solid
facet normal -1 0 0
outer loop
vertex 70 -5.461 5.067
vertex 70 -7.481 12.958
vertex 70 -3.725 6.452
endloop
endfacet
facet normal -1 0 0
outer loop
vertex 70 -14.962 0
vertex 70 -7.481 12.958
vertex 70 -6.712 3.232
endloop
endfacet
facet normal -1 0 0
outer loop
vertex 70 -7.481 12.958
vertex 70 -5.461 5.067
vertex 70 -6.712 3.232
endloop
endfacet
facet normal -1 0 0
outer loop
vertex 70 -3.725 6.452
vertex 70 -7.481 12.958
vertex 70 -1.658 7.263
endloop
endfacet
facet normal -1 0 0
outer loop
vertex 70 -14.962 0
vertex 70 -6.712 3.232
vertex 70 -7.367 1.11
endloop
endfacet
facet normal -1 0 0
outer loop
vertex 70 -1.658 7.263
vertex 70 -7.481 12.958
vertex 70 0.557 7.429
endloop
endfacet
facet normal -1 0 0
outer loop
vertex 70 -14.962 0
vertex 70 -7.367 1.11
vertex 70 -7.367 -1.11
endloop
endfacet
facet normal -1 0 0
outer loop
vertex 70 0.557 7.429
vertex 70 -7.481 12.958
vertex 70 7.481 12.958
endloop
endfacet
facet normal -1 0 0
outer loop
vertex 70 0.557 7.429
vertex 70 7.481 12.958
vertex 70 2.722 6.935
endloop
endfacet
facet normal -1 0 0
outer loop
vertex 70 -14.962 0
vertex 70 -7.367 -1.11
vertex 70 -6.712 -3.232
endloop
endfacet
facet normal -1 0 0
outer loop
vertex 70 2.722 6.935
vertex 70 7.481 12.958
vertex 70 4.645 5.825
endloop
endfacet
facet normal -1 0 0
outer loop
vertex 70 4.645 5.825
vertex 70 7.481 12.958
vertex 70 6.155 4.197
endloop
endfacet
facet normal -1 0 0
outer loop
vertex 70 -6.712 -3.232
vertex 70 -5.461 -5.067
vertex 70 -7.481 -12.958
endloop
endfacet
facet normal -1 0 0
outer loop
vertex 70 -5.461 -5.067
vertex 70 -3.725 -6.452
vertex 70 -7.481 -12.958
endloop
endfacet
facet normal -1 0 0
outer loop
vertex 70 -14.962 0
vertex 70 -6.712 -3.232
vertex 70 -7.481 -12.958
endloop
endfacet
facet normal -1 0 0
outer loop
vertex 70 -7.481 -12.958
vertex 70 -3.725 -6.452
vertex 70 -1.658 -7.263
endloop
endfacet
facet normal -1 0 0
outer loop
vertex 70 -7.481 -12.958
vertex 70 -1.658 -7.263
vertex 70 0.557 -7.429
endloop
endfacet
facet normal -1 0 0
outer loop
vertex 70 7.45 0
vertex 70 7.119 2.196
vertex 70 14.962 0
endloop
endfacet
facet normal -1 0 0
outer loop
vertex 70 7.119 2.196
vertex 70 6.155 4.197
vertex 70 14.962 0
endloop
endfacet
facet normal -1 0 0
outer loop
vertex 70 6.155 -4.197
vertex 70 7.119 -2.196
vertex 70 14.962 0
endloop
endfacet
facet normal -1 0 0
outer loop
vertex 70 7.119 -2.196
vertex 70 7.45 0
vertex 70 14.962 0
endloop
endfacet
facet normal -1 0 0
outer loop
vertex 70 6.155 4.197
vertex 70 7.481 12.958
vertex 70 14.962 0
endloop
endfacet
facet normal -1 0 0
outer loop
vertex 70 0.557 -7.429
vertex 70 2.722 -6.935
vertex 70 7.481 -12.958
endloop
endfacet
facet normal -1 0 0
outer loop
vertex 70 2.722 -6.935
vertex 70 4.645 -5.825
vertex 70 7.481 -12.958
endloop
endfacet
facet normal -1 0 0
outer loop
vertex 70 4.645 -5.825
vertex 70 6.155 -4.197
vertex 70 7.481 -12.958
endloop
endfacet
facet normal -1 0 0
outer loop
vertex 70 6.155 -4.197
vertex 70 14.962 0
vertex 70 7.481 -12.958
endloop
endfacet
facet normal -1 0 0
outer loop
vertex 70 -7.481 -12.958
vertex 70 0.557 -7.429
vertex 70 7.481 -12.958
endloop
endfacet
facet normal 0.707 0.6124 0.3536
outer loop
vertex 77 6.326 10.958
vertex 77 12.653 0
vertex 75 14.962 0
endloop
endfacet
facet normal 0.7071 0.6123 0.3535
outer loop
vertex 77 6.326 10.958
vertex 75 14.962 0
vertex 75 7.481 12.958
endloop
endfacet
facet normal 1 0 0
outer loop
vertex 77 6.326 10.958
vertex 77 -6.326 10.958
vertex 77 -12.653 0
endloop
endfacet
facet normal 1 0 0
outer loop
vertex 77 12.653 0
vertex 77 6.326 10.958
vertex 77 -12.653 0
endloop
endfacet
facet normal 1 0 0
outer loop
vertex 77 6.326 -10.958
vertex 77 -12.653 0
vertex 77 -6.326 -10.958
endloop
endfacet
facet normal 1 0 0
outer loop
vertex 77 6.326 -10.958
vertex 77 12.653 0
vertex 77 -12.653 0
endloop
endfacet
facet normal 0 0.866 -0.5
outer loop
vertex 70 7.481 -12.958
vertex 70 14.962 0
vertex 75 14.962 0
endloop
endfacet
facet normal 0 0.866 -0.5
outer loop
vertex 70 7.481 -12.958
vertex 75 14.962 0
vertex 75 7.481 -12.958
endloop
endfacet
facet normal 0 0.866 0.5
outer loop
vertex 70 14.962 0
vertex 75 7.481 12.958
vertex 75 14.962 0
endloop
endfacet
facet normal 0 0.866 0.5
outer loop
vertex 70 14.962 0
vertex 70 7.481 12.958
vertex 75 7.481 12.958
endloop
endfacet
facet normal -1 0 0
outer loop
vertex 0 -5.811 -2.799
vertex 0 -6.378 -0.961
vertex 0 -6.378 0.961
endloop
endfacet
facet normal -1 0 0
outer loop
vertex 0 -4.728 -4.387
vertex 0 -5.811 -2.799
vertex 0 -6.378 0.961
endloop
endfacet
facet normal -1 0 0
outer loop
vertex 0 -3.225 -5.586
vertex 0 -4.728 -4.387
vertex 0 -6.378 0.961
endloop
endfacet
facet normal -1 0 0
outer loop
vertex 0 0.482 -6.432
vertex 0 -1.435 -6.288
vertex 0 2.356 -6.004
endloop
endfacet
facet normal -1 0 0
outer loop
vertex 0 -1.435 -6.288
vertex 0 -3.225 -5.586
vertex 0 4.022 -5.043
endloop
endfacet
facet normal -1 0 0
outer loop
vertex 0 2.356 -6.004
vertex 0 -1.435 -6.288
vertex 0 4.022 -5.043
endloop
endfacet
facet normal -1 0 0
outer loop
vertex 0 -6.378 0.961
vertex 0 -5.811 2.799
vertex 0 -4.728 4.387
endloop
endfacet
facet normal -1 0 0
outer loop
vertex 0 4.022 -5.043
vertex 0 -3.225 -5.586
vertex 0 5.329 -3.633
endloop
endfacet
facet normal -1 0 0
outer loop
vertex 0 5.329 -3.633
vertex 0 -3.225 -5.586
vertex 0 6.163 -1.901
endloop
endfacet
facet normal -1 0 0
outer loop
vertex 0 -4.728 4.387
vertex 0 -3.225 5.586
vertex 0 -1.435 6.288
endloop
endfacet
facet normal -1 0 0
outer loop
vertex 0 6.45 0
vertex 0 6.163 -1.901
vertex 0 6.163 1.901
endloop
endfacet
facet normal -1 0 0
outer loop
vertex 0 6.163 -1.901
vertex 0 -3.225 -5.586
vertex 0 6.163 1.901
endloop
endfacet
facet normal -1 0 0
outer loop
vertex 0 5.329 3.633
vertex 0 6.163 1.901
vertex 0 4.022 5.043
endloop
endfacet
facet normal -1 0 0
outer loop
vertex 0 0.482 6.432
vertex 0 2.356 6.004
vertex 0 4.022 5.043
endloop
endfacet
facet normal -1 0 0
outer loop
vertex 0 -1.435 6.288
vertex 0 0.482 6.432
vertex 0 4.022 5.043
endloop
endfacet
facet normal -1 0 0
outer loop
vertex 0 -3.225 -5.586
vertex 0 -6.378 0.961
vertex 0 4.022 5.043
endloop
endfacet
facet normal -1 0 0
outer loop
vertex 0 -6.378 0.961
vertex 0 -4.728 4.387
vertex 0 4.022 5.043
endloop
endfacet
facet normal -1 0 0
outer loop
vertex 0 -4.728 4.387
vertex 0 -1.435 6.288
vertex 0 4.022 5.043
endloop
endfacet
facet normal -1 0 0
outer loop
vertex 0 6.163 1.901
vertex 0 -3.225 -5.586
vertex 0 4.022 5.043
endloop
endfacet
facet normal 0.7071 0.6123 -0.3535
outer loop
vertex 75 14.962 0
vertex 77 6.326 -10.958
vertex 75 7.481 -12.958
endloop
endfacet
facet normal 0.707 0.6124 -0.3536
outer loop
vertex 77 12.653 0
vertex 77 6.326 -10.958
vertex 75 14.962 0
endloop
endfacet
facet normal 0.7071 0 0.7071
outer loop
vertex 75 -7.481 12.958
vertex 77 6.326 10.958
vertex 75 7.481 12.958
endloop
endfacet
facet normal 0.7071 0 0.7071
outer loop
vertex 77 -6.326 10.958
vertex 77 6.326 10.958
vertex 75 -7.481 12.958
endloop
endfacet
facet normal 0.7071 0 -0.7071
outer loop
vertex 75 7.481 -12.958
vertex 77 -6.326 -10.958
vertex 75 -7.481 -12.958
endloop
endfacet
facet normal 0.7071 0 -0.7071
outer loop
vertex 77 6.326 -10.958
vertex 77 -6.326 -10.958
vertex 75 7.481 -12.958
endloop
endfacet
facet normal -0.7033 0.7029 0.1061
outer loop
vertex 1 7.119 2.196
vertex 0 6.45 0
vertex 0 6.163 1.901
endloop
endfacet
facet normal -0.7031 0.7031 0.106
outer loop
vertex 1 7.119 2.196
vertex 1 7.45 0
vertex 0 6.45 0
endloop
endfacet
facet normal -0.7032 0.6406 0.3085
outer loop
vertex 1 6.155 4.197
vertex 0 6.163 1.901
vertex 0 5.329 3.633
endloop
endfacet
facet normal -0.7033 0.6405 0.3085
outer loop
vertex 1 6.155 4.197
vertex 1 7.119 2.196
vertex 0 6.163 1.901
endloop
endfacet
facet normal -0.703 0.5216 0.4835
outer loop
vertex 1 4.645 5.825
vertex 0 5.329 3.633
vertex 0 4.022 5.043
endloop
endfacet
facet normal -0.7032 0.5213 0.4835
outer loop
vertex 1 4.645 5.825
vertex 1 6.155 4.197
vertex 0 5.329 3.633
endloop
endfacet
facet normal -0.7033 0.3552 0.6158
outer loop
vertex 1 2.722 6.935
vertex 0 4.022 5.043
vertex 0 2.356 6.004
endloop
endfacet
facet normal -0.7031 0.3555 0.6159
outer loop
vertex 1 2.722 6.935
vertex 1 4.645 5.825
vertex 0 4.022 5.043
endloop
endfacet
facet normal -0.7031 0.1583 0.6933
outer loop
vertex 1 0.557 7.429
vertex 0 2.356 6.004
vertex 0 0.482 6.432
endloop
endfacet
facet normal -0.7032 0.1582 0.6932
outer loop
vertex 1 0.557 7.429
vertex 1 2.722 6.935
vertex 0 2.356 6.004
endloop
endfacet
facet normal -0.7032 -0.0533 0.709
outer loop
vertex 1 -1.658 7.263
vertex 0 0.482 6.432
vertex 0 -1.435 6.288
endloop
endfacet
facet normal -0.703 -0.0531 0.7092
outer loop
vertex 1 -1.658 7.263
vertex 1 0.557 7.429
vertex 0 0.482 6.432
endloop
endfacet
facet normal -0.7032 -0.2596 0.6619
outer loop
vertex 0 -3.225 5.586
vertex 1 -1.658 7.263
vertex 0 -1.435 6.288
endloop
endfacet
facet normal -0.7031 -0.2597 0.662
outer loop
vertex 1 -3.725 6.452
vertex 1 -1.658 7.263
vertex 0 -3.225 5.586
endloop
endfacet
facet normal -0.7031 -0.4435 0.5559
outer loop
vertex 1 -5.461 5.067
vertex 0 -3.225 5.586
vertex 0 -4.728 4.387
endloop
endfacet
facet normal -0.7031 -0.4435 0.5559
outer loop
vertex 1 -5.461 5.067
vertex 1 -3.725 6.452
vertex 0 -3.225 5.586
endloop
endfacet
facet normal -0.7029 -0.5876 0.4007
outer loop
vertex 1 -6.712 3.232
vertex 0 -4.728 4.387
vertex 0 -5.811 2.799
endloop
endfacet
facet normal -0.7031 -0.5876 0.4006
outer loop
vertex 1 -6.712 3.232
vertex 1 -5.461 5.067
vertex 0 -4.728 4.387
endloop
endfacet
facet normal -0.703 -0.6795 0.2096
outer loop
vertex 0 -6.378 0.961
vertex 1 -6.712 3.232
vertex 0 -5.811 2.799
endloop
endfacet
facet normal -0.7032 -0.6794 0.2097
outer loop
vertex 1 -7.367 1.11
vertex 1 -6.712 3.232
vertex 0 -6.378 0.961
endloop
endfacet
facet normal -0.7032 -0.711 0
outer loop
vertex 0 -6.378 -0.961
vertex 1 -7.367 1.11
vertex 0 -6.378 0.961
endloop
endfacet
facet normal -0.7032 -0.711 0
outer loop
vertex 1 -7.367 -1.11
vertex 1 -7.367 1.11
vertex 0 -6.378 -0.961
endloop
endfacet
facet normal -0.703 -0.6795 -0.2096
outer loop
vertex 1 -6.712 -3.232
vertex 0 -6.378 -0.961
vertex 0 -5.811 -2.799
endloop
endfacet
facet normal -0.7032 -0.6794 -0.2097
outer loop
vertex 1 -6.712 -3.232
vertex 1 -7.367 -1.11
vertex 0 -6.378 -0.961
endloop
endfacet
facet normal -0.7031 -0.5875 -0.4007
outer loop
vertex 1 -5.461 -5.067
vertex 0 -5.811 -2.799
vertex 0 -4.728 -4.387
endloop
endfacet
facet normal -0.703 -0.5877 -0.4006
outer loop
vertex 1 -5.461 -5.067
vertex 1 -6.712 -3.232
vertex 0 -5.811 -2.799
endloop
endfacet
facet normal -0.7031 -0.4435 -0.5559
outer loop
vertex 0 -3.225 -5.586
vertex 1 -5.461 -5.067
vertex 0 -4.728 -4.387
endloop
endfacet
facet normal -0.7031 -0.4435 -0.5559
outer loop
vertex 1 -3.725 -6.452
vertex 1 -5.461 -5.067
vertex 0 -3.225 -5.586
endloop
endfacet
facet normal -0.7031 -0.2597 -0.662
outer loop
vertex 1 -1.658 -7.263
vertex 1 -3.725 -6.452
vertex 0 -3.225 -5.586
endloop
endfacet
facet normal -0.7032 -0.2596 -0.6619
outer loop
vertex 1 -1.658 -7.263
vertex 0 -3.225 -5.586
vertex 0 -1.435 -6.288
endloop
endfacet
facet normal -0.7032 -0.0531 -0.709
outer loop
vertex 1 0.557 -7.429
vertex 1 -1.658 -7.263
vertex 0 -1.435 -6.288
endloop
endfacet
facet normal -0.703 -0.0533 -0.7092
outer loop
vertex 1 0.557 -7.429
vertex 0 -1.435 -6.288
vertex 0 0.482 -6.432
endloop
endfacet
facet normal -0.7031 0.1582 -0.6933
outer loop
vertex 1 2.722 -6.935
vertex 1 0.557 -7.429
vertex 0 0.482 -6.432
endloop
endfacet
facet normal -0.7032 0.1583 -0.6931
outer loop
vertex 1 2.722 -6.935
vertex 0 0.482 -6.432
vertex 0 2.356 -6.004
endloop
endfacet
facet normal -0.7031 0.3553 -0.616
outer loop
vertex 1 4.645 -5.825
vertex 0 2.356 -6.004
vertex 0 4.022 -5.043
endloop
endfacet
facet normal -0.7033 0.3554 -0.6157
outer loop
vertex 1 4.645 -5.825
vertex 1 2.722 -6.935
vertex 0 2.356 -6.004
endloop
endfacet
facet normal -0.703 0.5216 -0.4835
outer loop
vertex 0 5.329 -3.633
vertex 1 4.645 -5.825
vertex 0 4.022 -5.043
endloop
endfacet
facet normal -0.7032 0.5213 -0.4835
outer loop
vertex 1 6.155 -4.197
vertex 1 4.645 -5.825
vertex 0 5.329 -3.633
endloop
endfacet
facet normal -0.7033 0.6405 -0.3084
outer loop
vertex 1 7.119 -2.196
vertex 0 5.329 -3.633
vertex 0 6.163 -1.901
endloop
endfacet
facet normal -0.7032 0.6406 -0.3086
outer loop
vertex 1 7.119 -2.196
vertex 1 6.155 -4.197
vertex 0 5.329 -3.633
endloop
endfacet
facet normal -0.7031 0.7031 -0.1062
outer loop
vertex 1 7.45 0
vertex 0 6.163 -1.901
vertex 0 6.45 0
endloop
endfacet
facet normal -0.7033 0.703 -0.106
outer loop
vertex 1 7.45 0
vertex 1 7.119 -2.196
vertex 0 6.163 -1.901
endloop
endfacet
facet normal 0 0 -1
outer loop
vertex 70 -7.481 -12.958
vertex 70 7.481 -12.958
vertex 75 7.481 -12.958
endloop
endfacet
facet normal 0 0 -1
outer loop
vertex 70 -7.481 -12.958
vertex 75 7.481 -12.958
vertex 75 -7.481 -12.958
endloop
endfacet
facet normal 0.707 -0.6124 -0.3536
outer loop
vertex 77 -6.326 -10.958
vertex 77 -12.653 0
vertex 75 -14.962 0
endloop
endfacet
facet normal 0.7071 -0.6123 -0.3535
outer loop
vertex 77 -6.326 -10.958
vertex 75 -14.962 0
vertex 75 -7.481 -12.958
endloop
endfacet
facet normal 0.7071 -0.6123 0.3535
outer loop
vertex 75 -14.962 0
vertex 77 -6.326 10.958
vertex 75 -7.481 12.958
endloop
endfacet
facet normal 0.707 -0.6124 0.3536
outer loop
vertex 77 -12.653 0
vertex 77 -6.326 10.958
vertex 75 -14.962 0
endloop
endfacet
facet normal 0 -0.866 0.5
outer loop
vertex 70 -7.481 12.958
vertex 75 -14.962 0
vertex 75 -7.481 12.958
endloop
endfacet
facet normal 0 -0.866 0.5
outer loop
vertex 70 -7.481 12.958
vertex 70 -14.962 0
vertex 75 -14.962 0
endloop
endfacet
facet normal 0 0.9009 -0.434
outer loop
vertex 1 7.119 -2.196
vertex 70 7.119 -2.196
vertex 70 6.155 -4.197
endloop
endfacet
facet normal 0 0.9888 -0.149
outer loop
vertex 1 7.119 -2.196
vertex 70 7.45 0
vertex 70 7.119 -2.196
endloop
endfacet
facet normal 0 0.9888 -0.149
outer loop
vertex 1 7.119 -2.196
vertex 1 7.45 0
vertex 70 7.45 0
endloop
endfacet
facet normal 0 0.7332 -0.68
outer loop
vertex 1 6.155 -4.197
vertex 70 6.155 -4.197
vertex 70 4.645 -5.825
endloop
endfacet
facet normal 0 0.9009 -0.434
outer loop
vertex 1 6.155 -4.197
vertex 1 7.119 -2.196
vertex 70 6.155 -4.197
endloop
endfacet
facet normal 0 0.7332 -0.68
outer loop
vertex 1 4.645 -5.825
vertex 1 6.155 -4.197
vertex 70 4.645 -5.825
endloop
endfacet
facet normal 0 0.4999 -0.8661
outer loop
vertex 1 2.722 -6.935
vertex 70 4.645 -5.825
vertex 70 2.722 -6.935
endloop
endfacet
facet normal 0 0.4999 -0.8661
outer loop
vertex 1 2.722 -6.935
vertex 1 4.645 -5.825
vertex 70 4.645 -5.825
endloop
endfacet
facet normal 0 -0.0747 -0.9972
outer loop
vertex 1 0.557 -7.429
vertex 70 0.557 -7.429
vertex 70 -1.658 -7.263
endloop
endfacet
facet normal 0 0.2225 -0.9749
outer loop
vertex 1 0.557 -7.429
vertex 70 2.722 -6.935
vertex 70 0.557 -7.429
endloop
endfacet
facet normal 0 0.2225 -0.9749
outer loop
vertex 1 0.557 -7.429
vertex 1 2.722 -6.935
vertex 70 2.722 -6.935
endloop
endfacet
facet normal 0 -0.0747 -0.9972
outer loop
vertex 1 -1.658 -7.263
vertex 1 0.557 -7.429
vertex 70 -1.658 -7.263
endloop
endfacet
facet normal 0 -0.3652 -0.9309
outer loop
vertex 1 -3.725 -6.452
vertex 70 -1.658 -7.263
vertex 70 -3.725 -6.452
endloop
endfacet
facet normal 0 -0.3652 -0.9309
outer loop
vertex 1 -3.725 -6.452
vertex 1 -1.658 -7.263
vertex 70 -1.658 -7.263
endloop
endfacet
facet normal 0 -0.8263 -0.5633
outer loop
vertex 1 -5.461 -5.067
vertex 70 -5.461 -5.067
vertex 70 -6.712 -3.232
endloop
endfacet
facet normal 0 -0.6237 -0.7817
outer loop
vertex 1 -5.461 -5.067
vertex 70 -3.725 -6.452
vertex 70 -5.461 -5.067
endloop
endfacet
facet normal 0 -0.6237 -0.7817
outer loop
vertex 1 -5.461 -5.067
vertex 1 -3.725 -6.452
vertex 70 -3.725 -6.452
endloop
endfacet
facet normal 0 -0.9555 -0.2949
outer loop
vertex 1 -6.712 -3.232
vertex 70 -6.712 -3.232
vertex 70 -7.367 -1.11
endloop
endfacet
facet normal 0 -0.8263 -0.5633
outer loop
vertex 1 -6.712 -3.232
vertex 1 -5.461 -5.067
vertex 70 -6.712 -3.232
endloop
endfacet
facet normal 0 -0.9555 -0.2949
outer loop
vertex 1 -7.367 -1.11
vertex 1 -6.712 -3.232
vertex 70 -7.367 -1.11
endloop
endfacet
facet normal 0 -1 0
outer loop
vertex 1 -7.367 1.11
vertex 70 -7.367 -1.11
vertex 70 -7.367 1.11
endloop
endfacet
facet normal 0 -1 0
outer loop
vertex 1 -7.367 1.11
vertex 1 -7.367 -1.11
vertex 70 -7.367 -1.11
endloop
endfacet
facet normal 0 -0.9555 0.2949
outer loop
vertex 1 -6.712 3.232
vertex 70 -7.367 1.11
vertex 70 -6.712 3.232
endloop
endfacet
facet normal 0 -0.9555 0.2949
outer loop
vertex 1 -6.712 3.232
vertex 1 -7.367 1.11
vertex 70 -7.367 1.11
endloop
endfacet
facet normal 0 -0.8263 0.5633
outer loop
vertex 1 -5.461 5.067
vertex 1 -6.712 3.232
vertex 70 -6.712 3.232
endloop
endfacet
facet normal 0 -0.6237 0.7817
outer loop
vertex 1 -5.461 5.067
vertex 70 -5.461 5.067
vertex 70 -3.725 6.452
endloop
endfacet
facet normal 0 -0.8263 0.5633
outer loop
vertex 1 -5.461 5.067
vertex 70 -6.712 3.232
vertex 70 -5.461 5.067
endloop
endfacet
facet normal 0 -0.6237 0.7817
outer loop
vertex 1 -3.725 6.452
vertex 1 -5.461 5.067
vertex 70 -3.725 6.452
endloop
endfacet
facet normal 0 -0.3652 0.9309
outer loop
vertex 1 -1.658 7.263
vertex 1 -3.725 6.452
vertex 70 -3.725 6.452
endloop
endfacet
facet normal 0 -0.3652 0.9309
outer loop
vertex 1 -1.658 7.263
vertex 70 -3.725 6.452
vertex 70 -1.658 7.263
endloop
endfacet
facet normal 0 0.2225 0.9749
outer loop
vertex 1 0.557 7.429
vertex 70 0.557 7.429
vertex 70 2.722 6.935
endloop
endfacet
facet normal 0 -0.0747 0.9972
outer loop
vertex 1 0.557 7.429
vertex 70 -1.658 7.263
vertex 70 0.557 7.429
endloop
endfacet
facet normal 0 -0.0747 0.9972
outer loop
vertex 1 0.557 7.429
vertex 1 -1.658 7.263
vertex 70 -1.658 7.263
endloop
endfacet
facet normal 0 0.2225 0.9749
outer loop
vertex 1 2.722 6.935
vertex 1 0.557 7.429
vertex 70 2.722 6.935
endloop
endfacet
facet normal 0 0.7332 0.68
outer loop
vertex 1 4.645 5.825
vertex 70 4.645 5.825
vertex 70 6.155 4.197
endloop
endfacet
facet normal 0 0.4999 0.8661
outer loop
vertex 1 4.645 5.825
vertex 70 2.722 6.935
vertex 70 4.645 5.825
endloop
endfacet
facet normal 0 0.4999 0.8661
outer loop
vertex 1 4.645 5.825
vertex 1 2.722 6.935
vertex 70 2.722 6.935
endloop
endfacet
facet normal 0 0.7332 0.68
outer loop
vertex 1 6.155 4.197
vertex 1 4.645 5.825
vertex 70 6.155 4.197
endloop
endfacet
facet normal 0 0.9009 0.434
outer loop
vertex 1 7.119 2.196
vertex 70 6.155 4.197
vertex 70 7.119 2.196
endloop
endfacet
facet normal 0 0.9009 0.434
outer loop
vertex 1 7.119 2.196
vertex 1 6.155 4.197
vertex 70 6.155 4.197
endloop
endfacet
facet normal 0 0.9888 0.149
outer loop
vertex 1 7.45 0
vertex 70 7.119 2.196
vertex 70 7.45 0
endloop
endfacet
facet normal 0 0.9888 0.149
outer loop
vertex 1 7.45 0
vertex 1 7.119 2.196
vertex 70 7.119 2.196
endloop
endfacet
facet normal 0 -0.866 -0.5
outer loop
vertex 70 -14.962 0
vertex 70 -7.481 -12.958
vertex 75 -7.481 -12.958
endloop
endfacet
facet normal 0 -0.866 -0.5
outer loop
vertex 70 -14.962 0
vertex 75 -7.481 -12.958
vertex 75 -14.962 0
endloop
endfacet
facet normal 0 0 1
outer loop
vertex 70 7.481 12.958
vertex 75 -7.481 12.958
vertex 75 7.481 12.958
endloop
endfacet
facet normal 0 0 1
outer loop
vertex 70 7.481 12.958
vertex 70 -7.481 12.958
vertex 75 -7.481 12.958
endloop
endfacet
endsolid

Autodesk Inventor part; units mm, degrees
ref_plane "YZ Plane" through (0, 0, 0) normal (1, 0, 0) x (0, 1, 0)
ref_plane "XZ Plane" through (0, 0, 0) normal (0, 1, 0) x (-1, 0, 0)
ref_plane "XY Plane" through (0, 0, 0) normal (0, 0, 1) x (1, 0, 0)
sketch "Sketch1" plane through (0, 0, 0) normal (1, 0, 0) x (0, 1, 0)
  circle A0 centre (0, 0) radius 7.45
  dimension "d0" = 14.9
extrude "Extrusion1" add sketch "Sketch1" along normal blind 70
sketch "Sketch2" plane through (70, 0, 0) normal (1, 0, 0) x (0, 0, -1)
  line L0 (0, 14.962) -> (12.9575, 7.481)
  line L1 (12.9575, 7.481) -> (12.9575, -7.481)
  line L2 (12.9575, -7.481) -> (0, -14.962)
  line L3 (0, -14.962) -> (-12.9575, -7.481)
  line L4 (-12.9575, -7.481) -> (-12.9575, 7.481)
  line L5 (-12.9575, 7.481) -> (0, 14.962)
  point P0 (0, 0)
  point P1 (0, 0)
  dimension "d12" = 25.915
  dimension "d13" = 14.962
extrude "Extrusion2" add sketch "Sketch2" along normal blind 7
chamfer "Chamfer1" distance 1 angle 45 1 edges at (0, -7.45, 0)
sketch "Sketch3" plane through (0, 0, 0) normal (0, 0, 1) x (1, 0, 0)
  point P0 (0, 0)
thread "Thread2" size "M15x1.5" class "6g" standard "ANSI Metric M Profile" full length
chamfer "Chamfer2" distance 2 angle 45 6 edges at (77, 11.2215, -6.4788) (77, 11.2215, 6.4788) (77, 0, 12.9575) (77, -11.2215, 6.4788) (77, -11.2215, -6.4788) (77, 0, -12.9575)
properties part number "bolt" material "Iron, Cast"
